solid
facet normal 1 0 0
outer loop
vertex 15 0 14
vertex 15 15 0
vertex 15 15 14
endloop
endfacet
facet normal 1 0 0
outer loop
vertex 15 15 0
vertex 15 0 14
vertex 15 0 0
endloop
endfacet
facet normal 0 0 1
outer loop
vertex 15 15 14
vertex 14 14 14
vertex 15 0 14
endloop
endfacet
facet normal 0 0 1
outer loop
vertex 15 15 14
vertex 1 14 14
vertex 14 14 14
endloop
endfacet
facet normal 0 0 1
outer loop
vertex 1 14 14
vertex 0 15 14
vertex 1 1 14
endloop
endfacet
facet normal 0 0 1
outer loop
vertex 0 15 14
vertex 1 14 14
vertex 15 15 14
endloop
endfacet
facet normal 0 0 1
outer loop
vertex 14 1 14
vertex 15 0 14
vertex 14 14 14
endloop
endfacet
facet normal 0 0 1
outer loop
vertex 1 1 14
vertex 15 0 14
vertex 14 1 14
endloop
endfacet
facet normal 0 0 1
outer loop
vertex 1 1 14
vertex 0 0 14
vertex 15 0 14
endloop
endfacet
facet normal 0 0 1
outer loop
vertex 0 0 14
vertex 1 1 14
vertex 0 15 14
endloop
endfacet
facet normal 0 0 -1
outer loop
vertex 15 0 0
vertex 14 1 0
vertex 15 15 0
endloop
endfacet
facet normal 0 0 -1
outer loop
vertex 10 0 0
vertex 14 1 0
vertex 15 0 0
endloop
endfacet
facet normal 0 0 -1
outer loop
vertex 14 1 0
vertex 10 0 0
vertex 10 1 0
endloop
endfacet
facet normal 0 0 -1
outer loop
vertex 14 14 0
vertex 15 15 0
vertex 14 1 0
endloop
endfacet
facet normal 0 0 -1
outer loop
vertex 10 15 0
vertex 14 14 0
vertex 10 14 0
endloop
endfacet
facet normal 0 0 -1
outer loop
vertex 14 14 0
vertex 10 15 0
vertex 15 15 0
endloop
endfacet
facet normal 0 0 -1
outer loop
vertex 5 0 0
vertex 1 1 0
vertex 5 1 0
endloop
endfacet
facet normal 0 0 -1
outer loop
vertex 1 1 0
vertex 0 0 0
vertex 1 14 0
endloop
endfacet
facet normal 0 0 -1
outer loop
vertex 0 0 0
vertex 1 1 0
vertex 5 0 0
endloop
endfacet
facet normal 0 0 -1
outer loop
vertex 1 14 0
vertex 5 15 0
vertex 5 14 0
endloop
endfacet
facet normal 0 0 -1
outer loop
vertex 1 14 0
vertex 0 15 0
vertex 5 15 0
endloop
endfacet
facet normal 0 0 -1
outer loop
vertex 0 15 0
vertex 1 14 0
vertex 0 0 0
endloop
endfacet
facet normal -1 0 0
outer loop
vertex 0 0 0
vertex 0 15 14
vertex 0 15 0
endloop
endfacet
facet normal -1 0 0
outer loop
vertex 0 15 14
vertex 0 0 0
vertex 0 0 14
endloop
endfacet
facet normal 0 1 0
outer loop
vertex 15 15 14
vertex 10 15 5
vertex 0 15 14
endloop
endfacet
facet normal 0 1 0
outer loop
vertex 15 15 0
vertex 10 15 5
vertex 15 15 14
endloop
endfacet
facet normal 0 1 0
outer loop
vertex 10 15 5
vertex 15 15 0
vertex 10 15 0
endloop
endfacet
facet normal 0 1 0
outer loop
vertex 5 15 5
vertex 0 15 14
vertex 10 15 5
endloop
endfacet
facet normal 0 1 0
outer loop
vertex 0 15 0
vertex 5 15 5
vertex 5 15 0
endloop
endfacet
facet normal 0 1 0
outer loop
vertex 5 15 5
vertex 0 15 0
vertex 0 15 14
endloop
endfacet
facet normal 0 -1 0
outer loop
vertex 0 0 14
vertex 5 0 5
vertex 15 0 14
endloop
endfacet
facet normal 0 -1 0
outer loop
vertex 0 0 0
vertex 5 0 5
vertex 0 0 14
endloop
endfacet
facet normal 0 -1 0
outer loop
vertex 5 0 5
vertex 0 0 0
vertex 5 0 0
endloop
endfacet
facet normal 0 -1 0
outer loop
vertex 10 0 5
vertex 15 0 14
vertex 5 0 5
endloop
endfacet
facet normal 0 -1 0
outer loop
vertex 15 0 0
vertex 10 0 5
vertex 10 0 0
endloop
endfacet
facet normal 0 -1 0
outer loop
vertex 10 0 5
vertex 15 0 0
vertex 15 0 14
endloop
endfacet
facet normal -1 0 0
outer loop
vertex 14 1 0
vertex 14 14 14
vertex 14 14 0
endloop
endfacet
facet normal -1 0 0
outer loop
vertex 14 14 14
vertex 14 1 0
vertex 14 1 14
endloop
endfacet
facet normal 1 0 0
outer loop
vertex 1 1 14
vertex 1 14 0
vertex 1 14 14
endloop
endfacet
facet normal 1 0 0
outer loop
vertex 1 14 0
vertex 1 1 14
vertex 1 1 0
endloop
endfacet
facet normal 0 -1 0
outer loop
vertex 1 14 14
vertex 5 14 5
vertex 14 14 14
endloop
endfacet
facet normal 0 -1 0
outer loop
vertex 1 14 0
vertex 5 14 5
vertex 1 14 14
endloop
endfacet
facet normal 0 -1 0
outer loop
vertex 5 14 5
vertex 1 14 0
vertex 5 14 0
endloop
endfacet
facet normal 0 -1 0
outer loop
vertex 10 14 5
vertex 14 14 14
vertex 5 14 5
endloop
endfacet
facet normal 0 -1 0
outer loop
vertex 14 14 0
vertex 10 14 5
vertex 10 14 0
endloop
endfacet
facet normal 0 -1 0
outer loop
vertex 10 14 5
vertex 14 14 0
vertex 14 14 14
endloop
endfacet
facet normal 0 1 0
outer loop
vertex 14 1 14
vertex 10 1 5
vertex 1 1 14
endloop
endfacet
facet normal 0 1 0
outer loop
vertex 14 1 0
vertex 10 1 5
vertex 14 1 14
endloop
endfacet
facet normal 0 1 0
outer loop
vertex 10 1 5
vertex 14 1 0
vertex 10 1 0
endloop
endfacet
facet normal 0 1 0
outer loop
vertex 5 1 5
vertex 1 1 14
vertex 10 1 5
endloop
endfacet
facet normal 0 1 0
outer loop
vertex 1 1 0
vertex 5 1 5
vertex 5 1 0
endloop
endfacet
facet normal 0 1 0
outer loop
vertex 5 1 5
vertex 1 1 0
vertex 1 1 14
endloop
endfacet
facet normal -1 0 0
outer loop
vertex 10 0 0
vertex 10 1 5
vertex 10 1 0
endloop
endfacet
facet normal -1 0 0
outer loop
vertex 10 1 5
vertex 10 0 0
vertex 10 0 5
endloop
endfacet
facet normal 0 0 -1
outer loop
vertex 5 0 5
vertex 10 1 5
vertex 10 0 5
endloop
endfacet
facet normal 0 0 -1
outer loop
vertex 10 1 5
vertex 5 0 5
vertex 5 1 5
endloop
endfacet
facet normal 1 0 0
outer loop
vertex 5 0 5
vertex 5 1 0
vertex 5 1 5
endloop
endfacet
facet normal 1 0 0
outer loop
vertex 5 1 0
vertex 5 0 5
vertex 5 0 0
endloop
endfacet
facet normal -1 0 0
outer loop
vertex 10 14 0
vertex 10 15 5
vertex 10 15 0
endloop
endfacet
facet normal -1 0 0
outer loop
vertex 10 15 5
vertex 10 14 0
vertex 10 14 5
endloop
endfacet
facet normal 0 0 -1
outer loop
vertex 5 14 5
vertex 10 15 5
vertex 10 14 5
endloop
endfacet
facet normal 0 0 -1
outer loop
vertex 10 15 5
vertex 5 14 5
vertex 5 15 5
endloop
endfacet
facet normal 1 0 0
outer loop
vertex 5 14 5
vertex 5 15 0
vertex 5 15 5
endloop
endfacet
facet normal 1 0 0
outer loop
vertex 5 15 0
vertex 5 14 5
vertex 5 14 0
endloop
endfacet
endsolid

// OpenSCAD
// length of the cube in mm
length=150;
// height of the cube in mm
height=140;

// thikness of the wall
wall=20;

// scale smaller so slicer sice is correct
scale(0.1) {
difference() {
  cube(size=[length,length,height]);
    // hollow the cube
    translate([wall/2,wall/2,0]) {
    cube(size=[length-wall,length-wall,height]);
  }
  
  // right middle hole
  translate([length/3,0,0]) {
    cube(size=[50,wall,50]);
  }
  
  // left middle hole
  translate([length/3,length-wall,0]) {
    cube(size=[50,wall,50]);
  }
}
}
